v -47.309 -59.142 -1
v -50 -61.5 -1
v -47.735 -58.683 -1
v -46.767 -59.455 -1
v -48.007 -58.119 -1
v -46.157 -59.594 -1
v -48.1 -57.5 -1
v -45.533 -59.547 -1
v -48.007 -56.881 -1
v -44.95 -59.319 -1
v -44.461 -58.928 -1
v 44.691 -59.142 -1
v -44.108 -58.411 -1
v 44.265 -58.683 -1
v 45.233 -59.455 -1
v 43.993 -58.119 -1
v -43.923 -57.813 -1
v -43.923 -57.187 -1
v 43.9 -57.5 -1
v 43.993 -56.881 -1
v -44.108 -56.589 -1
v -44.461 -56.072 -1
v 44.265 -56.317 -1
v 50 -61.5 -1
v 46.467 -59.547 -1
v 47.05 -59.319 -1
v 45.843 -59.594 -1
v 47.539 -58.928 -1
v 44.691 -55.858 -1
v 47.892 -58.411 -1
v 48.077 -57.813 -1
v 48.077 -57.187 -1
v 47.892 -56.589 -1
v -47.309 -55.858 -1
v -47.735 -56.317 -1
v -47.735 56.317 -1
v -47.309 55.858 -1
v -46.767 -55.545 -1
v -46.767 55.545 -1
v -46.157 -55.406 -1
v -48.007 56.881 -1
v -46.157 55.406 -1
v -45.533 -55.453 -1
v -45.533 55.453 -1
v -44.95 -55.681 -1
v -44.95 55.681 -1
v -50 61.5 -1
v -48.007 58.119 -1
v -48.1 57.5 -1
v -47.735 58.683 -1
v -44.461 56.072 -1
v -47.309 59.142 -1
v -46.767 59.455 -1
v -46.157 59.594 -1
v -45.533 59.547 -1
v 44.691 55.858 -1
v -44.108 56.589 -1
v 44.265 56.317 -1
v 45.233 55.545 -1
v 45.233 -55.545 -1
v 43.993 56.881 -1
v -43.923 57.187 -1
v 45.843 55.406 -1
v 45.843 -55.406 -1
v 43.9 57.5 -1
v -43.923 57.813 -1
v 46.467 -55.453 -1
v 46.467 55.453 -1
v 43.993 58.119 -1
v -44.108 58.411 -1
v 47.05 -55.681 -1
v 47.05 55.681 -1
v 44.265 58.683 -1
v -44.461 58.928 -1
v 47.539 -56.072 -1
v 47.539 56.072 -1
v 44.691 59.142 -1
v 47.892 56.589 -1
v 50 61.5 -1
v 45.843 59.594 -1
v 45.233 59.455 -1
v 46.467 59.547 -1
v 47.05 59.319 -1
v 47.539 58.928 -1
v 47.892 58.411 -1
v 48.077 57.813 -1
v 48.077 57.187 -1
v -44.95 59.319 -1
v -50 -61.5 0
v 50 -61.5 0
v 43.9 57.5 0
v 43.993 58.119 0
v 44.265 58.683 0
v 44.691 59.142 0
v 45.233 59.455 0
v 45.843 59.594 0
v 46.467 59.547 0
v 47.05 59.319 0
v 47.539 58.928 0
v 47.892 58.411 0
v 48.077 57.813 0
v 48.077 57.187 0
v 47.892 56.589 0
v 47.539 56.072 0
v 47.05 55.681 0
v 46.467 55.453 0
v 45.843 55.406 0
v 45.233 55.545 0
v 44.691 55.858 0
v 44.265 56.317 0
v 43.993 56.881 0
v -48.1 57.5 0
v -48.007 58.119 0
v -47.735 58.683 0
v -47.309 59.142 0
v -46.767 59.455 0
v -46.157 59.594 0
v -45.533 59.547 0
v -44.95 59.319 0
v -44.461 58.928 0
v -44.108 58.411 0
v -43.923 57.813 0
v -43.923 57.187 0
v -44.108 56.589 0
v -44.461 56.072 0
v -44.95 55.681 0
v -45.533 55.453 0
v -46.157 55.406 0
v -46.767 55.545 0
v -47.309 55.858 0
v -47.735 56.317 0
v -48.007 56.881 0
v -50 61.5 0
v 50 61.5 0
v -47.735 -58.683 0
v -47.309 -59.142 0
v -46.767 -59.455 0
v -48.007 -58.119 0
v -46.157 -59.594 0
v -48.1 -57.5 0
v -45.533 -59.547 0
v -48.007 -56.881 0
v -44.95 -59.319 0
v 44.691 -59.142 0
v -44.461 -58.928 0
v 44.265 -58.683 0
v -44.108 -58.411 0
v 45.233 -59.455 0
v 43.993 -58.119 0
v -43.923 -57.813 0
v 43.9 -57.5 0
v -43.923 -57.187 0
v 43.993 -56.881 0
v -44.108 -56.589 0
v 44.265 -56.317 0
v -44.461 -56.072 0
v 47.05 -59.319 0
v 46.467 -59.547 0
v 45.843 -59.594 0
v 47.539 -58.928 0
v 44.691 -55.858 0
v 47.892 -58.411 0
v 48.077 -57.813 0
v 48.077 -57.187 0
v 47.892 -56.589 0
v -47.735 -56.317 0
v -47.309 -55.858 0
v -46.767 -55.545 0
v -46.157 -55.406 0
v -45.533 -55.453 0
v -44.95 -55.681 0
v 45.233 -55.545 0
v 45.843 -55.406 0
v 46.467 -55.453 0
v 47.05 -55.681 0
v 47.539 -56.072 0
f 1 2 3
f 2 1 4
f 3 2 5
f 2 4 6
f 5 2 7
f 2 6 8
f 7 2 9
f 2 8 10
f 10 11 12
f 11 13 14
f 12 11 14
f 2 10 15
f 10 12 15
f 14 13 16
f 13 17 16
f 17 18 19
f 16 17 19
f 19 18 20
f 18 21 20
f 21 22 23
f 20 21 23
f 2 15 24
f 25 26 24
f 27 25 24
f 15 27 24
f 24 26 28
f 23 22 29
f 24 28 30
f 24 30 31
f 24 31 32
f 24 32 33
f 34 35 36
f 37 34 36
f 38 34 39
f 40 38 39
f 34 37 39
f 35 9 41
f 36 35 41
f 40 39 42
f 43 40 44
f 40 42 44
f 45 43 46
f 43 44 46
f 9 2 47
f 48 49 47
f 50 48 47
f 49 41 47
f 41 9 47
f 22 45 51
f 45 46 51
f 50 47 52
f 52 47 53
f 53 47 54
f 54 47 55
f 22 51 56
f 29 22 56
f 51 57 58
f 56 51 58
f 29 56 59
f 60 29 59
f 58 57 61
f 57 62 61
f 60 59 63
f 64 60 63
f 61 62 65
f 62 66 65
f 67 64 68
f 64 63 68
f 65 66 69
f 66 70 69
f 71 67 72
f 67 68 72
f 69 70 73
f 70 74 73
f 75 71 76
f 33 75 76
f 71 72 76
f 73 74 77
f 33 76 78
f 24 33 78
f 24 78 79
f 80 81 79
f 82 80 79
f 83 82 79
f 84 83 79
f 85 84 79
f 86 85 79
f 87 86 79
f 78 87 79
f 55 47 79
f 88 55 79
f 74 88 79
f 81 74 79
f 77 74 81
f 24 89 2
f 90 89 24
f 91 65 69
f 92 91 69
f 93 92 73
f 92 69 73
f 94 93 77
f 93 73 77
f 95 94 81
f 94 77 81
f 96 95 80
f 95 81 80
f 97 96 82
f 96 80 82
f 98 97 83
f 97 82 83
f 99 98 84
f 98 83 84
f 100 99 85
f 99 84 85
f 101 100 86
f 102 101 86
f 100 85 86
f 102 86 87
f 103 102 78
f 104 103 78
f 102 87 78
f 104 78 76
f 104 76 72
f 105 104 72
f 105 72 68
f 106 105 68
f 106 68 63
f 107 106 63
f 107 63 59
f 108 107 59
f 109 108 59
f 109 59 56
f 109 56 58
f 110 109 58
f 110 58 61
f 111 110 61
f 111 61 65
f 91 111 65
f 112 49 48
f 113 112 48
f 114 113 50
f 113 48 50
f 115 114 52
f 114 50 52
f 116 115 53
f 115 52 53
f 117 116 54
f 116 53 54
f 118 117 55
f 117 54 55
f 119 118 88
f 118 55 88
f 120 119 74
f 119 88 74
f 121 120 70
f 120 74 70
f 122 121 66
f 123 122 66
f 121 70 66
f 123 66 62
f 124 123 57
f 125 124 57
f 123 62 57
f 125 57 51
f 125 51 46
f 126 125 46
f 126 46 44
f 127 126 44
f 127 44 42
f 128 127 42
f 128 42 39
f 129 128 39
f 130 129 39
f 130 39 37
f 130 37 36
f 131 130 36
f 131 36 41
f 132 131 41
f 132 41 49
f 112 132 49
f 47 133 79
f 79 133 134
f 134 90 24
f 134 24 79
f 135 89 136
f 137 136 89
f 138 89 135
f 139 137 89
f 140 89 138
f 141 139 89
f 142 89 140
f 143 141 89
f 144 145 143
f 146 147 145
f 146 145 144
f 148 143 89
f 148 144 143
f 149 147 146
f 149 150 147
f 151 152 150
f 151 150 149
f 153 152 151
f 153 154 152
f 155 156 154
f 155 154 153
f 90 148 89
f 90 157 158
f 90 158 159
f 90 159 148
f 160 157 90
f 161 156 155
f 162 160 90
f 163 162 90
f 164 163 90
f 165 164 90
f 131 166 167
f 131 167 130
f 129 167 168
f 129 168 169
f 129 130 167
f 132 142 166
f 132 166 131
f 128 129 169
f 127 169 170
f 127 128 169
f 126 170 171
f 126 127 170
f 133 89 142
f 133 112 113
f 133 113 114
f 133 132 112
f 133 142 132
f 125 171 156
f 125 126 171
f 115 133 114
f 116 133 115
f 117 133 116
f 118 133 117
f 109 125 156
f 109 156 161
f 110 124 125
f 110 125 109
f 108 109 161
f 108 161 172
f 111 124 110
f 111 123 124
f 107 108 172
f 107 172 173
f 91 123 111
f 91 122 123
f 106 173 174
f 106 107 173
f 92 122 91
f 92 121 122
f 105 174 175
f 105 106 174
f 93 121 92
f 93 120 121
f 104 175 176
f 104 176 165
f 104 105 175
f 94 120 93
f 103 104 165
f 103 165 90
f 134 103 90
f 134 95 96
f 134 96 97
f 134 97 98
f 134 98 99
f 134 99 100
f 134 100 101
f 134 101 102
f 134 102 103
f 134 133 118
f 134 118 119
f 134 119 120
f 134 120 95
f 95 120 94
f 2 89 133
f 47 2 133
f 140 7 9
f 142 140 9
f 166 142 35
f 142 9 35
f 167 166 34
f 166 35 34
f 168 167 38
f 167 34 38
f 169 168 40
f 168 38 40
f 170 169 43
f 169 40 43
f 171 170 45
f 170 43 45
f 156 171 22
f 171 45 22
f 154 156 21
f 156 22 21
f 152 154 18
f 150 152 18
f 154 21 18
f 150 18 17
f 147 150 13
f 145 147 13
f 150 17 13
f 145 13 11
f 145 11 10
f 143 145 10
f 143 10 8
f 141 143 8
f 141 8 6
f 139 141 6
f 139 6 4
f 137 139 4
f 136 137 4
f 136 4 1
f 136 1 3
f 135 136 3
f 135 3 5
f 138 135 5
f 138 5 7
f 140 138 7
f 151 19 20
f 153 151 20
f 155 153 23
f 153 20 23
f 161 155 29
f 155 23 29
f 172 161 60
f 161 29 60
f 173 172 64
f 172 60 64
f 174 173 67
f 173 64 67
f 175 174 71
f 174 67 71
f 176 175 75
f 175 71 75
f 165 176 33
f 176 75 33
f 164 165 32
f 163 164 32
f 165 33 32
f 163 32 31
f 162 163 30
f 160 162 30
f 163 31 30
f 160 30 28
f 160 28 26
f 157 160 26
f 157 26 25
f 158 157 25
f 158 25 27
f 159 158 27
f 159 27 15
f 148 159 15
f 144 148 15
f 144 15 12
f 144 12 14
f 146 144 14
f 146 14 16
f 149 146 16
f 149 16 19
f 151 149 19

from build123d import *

# Parameters (mm, degrees)
F0_W     = 100
F0_H     = 123
F1_DEPTH = 1
F2_D     = 4.2
F2_DEPTH = 7


with BuildPart() as f1:
    # F0 (on Top) → F1 (new body)
    with BuildSketch(Plane.XY):
        Rectangle(F0_W, F0_H)
    extrude(amount=-F1_DEPTH)

    # F2
    with Locations(Plane.XY):
        with Locations((-46, 57.5), (-46, -57.5), (46, -57.5), (46, 57.5)):
            Hole(F2_D / 2, depth=F2_DEPTH)


solid = f1.part
